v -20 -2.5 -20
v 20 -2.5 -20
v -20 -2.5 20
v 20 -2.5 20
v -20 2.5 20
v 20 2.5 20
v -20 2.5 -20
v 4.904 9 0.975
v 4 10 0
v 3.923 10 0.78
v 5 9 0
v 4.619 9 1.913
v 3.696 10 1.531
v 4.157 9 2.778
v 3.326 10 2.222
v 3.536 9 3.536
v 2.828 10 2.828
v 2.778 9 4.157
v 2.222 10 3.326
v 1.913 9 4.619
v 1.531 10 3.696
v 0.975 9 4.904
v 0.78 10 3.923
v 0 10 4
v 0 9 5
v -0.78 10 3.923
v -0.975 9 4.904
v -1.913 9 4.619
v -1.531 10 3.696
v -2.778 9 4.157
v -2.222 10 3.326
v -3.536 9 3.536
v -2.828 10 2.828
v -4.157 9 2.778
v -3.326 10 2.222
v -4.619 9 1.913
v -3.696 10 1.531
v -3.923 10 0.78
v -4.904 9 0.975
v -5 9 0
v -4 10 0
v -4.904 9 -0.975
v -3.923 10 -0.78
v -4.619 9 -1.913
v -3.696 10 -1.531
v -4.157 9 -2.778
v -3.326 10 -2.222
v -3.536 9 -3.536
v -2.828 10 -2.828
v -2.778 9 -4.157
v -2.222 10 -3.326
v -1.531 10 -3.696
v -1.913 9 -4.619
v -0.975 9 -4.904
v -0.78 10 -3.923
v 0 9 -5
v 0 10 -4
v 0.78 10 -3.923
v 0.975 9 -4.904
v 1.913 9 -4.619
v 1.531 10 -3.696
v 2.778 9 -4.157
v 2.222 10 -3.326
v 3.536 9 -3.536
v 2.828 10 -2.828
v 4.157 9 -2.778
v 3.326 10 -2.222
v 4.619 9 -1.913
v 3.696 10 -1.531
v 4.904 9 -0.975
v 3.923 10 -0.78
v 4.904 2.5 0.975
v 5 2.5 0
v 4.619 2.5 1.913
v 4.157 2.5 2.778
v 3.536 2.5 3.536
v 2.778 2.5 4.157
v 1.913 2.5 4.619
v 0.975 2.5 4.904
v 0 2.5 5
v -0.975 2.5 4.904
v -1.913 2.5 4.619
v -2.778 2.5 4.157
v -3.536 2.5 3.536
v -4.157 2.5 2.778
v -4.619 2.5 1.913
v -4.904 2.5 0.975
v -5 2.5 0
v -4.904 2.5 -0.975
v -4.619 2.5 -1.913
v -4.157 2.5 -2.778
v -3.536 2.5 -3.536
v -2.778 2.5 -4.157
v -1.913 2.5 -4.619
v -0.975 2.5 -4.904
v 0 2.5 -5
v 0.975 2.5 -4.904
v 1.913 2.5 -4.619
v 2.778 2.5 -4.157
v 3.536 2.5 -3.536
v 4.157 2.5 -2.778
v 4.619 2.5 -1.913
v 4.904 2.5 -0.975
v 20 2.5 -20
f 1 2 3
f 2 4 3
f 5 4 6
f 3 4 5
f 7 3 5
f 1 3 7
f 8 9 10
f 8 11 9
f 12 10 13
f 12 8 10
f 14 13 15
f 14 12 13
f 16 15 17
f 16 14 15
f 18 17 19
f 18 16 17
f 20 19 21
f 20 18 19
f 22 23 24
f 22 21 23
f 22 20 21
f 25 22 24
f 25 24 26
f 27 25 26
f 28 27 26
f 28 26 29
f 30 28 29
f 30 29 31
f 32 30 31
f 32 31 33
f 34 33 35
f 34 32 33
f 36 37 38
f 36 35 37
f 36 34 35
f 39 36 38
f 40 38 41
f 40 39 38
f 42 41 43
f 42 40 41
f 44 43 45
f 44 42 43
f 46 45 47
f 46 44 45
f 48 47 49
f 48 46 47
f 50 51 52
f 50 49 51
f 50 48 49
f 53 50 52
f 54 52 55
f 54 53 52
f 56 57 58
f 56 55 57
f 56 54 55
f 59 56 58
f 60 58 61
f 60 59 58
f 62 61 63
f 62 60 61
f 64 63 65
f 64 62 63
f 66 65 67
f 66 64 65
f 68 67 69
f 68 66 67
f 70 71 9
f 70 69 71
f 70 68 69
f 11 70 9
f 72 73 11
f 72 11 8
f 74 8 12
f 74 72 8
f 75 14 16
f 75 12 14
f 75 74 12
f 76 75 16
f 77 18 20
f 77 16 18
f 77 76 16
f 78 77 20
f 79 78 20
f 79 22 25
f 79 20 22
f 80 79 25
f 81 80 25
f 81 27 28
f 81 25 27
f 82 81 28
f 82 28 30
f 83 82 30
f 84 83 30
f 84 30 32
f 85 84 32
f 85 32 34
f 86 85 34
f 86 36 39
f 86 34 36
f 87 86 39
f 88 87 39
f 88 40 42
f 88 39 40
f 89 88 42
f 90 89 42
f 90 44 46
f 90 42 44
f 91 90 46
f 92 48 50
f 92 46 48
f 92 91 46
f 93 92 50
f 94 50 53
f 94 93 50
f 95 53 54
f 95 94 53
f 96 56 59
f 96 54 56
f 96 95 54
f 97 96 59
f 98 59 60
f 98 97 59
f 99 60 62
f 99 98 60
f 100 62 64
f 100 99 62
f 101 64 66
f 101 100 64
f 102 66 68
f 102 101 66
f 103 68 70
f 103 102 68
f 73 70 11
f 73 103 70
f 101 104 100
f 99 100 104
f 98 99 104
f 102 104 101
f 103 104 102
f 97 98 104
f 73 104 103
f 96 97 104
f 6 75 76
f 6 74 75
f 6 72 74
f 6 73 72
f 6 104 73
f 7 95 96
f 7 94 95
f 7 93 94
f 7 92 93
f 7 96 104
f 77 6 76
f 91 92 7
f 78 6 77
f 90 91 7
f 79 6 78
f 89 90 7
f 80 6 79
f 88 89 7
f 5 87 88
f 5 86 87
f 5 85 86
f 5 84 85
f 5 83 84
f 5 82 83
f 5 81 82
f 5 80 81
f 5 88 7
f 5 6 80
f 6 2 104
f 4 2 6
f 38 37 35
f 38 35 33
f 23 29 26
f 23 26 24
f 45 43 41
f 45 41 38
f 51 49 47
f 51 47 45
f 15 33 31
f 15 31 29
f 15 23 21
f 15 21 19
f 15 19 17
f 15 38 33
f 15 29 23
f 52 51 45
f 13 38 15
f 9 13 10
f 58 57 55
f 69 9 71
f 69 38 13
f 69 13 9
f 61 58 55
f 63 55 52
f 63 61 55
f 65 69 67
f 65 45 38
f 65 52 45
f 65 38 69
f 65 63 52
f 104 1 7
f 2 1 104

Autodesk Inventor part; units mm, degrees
ref_plane "YZ Plane" through (0, 0, 0) normal (1, 0, 0) x (0, 1, 0)
ref_plane "XZ Plane" through (0, 0, 0) normal (0, 1, 0) x (-1, 0, 0)
ref_plane "XY Plane" through (0, 0, 0) normal (0, 0, 1) x (1, 0, 0)
sketch "Esboço1" plane through (0, 0, 0) normal (0, 1, 0) x (-1, 0, 0)
  line L0 (-20, 20) -> (20, 20)
  line L1 (20, 20) -> (20, -20)
  line L2 (20, -20) -> (-20, -20)
  line L3 (-20, -20) -> (-20, 20)
  point P0 (0, 0)
extrude "Extrusão1" add sketch "Esboço1" along normal mid plane 5
sketch "Esboço3" plane through (0, 2.5, 0) normal (0, 1, 0) x (1, 0, 0)
  circle A0 centre (0, 0) radius 5
  circle A1 centre (0, 0) radius 4
  dimension "d13" = 10
  dimension "d14" = 8
extrude "Extrusão2" add sketch "Esboço3" along normal blind 7.5 contours A0 | A1
chamfer "Chanfro1" distance 1 angle 45 1 edges at (-5, 10, 0)
properties part number "peça1_trabalho2"
